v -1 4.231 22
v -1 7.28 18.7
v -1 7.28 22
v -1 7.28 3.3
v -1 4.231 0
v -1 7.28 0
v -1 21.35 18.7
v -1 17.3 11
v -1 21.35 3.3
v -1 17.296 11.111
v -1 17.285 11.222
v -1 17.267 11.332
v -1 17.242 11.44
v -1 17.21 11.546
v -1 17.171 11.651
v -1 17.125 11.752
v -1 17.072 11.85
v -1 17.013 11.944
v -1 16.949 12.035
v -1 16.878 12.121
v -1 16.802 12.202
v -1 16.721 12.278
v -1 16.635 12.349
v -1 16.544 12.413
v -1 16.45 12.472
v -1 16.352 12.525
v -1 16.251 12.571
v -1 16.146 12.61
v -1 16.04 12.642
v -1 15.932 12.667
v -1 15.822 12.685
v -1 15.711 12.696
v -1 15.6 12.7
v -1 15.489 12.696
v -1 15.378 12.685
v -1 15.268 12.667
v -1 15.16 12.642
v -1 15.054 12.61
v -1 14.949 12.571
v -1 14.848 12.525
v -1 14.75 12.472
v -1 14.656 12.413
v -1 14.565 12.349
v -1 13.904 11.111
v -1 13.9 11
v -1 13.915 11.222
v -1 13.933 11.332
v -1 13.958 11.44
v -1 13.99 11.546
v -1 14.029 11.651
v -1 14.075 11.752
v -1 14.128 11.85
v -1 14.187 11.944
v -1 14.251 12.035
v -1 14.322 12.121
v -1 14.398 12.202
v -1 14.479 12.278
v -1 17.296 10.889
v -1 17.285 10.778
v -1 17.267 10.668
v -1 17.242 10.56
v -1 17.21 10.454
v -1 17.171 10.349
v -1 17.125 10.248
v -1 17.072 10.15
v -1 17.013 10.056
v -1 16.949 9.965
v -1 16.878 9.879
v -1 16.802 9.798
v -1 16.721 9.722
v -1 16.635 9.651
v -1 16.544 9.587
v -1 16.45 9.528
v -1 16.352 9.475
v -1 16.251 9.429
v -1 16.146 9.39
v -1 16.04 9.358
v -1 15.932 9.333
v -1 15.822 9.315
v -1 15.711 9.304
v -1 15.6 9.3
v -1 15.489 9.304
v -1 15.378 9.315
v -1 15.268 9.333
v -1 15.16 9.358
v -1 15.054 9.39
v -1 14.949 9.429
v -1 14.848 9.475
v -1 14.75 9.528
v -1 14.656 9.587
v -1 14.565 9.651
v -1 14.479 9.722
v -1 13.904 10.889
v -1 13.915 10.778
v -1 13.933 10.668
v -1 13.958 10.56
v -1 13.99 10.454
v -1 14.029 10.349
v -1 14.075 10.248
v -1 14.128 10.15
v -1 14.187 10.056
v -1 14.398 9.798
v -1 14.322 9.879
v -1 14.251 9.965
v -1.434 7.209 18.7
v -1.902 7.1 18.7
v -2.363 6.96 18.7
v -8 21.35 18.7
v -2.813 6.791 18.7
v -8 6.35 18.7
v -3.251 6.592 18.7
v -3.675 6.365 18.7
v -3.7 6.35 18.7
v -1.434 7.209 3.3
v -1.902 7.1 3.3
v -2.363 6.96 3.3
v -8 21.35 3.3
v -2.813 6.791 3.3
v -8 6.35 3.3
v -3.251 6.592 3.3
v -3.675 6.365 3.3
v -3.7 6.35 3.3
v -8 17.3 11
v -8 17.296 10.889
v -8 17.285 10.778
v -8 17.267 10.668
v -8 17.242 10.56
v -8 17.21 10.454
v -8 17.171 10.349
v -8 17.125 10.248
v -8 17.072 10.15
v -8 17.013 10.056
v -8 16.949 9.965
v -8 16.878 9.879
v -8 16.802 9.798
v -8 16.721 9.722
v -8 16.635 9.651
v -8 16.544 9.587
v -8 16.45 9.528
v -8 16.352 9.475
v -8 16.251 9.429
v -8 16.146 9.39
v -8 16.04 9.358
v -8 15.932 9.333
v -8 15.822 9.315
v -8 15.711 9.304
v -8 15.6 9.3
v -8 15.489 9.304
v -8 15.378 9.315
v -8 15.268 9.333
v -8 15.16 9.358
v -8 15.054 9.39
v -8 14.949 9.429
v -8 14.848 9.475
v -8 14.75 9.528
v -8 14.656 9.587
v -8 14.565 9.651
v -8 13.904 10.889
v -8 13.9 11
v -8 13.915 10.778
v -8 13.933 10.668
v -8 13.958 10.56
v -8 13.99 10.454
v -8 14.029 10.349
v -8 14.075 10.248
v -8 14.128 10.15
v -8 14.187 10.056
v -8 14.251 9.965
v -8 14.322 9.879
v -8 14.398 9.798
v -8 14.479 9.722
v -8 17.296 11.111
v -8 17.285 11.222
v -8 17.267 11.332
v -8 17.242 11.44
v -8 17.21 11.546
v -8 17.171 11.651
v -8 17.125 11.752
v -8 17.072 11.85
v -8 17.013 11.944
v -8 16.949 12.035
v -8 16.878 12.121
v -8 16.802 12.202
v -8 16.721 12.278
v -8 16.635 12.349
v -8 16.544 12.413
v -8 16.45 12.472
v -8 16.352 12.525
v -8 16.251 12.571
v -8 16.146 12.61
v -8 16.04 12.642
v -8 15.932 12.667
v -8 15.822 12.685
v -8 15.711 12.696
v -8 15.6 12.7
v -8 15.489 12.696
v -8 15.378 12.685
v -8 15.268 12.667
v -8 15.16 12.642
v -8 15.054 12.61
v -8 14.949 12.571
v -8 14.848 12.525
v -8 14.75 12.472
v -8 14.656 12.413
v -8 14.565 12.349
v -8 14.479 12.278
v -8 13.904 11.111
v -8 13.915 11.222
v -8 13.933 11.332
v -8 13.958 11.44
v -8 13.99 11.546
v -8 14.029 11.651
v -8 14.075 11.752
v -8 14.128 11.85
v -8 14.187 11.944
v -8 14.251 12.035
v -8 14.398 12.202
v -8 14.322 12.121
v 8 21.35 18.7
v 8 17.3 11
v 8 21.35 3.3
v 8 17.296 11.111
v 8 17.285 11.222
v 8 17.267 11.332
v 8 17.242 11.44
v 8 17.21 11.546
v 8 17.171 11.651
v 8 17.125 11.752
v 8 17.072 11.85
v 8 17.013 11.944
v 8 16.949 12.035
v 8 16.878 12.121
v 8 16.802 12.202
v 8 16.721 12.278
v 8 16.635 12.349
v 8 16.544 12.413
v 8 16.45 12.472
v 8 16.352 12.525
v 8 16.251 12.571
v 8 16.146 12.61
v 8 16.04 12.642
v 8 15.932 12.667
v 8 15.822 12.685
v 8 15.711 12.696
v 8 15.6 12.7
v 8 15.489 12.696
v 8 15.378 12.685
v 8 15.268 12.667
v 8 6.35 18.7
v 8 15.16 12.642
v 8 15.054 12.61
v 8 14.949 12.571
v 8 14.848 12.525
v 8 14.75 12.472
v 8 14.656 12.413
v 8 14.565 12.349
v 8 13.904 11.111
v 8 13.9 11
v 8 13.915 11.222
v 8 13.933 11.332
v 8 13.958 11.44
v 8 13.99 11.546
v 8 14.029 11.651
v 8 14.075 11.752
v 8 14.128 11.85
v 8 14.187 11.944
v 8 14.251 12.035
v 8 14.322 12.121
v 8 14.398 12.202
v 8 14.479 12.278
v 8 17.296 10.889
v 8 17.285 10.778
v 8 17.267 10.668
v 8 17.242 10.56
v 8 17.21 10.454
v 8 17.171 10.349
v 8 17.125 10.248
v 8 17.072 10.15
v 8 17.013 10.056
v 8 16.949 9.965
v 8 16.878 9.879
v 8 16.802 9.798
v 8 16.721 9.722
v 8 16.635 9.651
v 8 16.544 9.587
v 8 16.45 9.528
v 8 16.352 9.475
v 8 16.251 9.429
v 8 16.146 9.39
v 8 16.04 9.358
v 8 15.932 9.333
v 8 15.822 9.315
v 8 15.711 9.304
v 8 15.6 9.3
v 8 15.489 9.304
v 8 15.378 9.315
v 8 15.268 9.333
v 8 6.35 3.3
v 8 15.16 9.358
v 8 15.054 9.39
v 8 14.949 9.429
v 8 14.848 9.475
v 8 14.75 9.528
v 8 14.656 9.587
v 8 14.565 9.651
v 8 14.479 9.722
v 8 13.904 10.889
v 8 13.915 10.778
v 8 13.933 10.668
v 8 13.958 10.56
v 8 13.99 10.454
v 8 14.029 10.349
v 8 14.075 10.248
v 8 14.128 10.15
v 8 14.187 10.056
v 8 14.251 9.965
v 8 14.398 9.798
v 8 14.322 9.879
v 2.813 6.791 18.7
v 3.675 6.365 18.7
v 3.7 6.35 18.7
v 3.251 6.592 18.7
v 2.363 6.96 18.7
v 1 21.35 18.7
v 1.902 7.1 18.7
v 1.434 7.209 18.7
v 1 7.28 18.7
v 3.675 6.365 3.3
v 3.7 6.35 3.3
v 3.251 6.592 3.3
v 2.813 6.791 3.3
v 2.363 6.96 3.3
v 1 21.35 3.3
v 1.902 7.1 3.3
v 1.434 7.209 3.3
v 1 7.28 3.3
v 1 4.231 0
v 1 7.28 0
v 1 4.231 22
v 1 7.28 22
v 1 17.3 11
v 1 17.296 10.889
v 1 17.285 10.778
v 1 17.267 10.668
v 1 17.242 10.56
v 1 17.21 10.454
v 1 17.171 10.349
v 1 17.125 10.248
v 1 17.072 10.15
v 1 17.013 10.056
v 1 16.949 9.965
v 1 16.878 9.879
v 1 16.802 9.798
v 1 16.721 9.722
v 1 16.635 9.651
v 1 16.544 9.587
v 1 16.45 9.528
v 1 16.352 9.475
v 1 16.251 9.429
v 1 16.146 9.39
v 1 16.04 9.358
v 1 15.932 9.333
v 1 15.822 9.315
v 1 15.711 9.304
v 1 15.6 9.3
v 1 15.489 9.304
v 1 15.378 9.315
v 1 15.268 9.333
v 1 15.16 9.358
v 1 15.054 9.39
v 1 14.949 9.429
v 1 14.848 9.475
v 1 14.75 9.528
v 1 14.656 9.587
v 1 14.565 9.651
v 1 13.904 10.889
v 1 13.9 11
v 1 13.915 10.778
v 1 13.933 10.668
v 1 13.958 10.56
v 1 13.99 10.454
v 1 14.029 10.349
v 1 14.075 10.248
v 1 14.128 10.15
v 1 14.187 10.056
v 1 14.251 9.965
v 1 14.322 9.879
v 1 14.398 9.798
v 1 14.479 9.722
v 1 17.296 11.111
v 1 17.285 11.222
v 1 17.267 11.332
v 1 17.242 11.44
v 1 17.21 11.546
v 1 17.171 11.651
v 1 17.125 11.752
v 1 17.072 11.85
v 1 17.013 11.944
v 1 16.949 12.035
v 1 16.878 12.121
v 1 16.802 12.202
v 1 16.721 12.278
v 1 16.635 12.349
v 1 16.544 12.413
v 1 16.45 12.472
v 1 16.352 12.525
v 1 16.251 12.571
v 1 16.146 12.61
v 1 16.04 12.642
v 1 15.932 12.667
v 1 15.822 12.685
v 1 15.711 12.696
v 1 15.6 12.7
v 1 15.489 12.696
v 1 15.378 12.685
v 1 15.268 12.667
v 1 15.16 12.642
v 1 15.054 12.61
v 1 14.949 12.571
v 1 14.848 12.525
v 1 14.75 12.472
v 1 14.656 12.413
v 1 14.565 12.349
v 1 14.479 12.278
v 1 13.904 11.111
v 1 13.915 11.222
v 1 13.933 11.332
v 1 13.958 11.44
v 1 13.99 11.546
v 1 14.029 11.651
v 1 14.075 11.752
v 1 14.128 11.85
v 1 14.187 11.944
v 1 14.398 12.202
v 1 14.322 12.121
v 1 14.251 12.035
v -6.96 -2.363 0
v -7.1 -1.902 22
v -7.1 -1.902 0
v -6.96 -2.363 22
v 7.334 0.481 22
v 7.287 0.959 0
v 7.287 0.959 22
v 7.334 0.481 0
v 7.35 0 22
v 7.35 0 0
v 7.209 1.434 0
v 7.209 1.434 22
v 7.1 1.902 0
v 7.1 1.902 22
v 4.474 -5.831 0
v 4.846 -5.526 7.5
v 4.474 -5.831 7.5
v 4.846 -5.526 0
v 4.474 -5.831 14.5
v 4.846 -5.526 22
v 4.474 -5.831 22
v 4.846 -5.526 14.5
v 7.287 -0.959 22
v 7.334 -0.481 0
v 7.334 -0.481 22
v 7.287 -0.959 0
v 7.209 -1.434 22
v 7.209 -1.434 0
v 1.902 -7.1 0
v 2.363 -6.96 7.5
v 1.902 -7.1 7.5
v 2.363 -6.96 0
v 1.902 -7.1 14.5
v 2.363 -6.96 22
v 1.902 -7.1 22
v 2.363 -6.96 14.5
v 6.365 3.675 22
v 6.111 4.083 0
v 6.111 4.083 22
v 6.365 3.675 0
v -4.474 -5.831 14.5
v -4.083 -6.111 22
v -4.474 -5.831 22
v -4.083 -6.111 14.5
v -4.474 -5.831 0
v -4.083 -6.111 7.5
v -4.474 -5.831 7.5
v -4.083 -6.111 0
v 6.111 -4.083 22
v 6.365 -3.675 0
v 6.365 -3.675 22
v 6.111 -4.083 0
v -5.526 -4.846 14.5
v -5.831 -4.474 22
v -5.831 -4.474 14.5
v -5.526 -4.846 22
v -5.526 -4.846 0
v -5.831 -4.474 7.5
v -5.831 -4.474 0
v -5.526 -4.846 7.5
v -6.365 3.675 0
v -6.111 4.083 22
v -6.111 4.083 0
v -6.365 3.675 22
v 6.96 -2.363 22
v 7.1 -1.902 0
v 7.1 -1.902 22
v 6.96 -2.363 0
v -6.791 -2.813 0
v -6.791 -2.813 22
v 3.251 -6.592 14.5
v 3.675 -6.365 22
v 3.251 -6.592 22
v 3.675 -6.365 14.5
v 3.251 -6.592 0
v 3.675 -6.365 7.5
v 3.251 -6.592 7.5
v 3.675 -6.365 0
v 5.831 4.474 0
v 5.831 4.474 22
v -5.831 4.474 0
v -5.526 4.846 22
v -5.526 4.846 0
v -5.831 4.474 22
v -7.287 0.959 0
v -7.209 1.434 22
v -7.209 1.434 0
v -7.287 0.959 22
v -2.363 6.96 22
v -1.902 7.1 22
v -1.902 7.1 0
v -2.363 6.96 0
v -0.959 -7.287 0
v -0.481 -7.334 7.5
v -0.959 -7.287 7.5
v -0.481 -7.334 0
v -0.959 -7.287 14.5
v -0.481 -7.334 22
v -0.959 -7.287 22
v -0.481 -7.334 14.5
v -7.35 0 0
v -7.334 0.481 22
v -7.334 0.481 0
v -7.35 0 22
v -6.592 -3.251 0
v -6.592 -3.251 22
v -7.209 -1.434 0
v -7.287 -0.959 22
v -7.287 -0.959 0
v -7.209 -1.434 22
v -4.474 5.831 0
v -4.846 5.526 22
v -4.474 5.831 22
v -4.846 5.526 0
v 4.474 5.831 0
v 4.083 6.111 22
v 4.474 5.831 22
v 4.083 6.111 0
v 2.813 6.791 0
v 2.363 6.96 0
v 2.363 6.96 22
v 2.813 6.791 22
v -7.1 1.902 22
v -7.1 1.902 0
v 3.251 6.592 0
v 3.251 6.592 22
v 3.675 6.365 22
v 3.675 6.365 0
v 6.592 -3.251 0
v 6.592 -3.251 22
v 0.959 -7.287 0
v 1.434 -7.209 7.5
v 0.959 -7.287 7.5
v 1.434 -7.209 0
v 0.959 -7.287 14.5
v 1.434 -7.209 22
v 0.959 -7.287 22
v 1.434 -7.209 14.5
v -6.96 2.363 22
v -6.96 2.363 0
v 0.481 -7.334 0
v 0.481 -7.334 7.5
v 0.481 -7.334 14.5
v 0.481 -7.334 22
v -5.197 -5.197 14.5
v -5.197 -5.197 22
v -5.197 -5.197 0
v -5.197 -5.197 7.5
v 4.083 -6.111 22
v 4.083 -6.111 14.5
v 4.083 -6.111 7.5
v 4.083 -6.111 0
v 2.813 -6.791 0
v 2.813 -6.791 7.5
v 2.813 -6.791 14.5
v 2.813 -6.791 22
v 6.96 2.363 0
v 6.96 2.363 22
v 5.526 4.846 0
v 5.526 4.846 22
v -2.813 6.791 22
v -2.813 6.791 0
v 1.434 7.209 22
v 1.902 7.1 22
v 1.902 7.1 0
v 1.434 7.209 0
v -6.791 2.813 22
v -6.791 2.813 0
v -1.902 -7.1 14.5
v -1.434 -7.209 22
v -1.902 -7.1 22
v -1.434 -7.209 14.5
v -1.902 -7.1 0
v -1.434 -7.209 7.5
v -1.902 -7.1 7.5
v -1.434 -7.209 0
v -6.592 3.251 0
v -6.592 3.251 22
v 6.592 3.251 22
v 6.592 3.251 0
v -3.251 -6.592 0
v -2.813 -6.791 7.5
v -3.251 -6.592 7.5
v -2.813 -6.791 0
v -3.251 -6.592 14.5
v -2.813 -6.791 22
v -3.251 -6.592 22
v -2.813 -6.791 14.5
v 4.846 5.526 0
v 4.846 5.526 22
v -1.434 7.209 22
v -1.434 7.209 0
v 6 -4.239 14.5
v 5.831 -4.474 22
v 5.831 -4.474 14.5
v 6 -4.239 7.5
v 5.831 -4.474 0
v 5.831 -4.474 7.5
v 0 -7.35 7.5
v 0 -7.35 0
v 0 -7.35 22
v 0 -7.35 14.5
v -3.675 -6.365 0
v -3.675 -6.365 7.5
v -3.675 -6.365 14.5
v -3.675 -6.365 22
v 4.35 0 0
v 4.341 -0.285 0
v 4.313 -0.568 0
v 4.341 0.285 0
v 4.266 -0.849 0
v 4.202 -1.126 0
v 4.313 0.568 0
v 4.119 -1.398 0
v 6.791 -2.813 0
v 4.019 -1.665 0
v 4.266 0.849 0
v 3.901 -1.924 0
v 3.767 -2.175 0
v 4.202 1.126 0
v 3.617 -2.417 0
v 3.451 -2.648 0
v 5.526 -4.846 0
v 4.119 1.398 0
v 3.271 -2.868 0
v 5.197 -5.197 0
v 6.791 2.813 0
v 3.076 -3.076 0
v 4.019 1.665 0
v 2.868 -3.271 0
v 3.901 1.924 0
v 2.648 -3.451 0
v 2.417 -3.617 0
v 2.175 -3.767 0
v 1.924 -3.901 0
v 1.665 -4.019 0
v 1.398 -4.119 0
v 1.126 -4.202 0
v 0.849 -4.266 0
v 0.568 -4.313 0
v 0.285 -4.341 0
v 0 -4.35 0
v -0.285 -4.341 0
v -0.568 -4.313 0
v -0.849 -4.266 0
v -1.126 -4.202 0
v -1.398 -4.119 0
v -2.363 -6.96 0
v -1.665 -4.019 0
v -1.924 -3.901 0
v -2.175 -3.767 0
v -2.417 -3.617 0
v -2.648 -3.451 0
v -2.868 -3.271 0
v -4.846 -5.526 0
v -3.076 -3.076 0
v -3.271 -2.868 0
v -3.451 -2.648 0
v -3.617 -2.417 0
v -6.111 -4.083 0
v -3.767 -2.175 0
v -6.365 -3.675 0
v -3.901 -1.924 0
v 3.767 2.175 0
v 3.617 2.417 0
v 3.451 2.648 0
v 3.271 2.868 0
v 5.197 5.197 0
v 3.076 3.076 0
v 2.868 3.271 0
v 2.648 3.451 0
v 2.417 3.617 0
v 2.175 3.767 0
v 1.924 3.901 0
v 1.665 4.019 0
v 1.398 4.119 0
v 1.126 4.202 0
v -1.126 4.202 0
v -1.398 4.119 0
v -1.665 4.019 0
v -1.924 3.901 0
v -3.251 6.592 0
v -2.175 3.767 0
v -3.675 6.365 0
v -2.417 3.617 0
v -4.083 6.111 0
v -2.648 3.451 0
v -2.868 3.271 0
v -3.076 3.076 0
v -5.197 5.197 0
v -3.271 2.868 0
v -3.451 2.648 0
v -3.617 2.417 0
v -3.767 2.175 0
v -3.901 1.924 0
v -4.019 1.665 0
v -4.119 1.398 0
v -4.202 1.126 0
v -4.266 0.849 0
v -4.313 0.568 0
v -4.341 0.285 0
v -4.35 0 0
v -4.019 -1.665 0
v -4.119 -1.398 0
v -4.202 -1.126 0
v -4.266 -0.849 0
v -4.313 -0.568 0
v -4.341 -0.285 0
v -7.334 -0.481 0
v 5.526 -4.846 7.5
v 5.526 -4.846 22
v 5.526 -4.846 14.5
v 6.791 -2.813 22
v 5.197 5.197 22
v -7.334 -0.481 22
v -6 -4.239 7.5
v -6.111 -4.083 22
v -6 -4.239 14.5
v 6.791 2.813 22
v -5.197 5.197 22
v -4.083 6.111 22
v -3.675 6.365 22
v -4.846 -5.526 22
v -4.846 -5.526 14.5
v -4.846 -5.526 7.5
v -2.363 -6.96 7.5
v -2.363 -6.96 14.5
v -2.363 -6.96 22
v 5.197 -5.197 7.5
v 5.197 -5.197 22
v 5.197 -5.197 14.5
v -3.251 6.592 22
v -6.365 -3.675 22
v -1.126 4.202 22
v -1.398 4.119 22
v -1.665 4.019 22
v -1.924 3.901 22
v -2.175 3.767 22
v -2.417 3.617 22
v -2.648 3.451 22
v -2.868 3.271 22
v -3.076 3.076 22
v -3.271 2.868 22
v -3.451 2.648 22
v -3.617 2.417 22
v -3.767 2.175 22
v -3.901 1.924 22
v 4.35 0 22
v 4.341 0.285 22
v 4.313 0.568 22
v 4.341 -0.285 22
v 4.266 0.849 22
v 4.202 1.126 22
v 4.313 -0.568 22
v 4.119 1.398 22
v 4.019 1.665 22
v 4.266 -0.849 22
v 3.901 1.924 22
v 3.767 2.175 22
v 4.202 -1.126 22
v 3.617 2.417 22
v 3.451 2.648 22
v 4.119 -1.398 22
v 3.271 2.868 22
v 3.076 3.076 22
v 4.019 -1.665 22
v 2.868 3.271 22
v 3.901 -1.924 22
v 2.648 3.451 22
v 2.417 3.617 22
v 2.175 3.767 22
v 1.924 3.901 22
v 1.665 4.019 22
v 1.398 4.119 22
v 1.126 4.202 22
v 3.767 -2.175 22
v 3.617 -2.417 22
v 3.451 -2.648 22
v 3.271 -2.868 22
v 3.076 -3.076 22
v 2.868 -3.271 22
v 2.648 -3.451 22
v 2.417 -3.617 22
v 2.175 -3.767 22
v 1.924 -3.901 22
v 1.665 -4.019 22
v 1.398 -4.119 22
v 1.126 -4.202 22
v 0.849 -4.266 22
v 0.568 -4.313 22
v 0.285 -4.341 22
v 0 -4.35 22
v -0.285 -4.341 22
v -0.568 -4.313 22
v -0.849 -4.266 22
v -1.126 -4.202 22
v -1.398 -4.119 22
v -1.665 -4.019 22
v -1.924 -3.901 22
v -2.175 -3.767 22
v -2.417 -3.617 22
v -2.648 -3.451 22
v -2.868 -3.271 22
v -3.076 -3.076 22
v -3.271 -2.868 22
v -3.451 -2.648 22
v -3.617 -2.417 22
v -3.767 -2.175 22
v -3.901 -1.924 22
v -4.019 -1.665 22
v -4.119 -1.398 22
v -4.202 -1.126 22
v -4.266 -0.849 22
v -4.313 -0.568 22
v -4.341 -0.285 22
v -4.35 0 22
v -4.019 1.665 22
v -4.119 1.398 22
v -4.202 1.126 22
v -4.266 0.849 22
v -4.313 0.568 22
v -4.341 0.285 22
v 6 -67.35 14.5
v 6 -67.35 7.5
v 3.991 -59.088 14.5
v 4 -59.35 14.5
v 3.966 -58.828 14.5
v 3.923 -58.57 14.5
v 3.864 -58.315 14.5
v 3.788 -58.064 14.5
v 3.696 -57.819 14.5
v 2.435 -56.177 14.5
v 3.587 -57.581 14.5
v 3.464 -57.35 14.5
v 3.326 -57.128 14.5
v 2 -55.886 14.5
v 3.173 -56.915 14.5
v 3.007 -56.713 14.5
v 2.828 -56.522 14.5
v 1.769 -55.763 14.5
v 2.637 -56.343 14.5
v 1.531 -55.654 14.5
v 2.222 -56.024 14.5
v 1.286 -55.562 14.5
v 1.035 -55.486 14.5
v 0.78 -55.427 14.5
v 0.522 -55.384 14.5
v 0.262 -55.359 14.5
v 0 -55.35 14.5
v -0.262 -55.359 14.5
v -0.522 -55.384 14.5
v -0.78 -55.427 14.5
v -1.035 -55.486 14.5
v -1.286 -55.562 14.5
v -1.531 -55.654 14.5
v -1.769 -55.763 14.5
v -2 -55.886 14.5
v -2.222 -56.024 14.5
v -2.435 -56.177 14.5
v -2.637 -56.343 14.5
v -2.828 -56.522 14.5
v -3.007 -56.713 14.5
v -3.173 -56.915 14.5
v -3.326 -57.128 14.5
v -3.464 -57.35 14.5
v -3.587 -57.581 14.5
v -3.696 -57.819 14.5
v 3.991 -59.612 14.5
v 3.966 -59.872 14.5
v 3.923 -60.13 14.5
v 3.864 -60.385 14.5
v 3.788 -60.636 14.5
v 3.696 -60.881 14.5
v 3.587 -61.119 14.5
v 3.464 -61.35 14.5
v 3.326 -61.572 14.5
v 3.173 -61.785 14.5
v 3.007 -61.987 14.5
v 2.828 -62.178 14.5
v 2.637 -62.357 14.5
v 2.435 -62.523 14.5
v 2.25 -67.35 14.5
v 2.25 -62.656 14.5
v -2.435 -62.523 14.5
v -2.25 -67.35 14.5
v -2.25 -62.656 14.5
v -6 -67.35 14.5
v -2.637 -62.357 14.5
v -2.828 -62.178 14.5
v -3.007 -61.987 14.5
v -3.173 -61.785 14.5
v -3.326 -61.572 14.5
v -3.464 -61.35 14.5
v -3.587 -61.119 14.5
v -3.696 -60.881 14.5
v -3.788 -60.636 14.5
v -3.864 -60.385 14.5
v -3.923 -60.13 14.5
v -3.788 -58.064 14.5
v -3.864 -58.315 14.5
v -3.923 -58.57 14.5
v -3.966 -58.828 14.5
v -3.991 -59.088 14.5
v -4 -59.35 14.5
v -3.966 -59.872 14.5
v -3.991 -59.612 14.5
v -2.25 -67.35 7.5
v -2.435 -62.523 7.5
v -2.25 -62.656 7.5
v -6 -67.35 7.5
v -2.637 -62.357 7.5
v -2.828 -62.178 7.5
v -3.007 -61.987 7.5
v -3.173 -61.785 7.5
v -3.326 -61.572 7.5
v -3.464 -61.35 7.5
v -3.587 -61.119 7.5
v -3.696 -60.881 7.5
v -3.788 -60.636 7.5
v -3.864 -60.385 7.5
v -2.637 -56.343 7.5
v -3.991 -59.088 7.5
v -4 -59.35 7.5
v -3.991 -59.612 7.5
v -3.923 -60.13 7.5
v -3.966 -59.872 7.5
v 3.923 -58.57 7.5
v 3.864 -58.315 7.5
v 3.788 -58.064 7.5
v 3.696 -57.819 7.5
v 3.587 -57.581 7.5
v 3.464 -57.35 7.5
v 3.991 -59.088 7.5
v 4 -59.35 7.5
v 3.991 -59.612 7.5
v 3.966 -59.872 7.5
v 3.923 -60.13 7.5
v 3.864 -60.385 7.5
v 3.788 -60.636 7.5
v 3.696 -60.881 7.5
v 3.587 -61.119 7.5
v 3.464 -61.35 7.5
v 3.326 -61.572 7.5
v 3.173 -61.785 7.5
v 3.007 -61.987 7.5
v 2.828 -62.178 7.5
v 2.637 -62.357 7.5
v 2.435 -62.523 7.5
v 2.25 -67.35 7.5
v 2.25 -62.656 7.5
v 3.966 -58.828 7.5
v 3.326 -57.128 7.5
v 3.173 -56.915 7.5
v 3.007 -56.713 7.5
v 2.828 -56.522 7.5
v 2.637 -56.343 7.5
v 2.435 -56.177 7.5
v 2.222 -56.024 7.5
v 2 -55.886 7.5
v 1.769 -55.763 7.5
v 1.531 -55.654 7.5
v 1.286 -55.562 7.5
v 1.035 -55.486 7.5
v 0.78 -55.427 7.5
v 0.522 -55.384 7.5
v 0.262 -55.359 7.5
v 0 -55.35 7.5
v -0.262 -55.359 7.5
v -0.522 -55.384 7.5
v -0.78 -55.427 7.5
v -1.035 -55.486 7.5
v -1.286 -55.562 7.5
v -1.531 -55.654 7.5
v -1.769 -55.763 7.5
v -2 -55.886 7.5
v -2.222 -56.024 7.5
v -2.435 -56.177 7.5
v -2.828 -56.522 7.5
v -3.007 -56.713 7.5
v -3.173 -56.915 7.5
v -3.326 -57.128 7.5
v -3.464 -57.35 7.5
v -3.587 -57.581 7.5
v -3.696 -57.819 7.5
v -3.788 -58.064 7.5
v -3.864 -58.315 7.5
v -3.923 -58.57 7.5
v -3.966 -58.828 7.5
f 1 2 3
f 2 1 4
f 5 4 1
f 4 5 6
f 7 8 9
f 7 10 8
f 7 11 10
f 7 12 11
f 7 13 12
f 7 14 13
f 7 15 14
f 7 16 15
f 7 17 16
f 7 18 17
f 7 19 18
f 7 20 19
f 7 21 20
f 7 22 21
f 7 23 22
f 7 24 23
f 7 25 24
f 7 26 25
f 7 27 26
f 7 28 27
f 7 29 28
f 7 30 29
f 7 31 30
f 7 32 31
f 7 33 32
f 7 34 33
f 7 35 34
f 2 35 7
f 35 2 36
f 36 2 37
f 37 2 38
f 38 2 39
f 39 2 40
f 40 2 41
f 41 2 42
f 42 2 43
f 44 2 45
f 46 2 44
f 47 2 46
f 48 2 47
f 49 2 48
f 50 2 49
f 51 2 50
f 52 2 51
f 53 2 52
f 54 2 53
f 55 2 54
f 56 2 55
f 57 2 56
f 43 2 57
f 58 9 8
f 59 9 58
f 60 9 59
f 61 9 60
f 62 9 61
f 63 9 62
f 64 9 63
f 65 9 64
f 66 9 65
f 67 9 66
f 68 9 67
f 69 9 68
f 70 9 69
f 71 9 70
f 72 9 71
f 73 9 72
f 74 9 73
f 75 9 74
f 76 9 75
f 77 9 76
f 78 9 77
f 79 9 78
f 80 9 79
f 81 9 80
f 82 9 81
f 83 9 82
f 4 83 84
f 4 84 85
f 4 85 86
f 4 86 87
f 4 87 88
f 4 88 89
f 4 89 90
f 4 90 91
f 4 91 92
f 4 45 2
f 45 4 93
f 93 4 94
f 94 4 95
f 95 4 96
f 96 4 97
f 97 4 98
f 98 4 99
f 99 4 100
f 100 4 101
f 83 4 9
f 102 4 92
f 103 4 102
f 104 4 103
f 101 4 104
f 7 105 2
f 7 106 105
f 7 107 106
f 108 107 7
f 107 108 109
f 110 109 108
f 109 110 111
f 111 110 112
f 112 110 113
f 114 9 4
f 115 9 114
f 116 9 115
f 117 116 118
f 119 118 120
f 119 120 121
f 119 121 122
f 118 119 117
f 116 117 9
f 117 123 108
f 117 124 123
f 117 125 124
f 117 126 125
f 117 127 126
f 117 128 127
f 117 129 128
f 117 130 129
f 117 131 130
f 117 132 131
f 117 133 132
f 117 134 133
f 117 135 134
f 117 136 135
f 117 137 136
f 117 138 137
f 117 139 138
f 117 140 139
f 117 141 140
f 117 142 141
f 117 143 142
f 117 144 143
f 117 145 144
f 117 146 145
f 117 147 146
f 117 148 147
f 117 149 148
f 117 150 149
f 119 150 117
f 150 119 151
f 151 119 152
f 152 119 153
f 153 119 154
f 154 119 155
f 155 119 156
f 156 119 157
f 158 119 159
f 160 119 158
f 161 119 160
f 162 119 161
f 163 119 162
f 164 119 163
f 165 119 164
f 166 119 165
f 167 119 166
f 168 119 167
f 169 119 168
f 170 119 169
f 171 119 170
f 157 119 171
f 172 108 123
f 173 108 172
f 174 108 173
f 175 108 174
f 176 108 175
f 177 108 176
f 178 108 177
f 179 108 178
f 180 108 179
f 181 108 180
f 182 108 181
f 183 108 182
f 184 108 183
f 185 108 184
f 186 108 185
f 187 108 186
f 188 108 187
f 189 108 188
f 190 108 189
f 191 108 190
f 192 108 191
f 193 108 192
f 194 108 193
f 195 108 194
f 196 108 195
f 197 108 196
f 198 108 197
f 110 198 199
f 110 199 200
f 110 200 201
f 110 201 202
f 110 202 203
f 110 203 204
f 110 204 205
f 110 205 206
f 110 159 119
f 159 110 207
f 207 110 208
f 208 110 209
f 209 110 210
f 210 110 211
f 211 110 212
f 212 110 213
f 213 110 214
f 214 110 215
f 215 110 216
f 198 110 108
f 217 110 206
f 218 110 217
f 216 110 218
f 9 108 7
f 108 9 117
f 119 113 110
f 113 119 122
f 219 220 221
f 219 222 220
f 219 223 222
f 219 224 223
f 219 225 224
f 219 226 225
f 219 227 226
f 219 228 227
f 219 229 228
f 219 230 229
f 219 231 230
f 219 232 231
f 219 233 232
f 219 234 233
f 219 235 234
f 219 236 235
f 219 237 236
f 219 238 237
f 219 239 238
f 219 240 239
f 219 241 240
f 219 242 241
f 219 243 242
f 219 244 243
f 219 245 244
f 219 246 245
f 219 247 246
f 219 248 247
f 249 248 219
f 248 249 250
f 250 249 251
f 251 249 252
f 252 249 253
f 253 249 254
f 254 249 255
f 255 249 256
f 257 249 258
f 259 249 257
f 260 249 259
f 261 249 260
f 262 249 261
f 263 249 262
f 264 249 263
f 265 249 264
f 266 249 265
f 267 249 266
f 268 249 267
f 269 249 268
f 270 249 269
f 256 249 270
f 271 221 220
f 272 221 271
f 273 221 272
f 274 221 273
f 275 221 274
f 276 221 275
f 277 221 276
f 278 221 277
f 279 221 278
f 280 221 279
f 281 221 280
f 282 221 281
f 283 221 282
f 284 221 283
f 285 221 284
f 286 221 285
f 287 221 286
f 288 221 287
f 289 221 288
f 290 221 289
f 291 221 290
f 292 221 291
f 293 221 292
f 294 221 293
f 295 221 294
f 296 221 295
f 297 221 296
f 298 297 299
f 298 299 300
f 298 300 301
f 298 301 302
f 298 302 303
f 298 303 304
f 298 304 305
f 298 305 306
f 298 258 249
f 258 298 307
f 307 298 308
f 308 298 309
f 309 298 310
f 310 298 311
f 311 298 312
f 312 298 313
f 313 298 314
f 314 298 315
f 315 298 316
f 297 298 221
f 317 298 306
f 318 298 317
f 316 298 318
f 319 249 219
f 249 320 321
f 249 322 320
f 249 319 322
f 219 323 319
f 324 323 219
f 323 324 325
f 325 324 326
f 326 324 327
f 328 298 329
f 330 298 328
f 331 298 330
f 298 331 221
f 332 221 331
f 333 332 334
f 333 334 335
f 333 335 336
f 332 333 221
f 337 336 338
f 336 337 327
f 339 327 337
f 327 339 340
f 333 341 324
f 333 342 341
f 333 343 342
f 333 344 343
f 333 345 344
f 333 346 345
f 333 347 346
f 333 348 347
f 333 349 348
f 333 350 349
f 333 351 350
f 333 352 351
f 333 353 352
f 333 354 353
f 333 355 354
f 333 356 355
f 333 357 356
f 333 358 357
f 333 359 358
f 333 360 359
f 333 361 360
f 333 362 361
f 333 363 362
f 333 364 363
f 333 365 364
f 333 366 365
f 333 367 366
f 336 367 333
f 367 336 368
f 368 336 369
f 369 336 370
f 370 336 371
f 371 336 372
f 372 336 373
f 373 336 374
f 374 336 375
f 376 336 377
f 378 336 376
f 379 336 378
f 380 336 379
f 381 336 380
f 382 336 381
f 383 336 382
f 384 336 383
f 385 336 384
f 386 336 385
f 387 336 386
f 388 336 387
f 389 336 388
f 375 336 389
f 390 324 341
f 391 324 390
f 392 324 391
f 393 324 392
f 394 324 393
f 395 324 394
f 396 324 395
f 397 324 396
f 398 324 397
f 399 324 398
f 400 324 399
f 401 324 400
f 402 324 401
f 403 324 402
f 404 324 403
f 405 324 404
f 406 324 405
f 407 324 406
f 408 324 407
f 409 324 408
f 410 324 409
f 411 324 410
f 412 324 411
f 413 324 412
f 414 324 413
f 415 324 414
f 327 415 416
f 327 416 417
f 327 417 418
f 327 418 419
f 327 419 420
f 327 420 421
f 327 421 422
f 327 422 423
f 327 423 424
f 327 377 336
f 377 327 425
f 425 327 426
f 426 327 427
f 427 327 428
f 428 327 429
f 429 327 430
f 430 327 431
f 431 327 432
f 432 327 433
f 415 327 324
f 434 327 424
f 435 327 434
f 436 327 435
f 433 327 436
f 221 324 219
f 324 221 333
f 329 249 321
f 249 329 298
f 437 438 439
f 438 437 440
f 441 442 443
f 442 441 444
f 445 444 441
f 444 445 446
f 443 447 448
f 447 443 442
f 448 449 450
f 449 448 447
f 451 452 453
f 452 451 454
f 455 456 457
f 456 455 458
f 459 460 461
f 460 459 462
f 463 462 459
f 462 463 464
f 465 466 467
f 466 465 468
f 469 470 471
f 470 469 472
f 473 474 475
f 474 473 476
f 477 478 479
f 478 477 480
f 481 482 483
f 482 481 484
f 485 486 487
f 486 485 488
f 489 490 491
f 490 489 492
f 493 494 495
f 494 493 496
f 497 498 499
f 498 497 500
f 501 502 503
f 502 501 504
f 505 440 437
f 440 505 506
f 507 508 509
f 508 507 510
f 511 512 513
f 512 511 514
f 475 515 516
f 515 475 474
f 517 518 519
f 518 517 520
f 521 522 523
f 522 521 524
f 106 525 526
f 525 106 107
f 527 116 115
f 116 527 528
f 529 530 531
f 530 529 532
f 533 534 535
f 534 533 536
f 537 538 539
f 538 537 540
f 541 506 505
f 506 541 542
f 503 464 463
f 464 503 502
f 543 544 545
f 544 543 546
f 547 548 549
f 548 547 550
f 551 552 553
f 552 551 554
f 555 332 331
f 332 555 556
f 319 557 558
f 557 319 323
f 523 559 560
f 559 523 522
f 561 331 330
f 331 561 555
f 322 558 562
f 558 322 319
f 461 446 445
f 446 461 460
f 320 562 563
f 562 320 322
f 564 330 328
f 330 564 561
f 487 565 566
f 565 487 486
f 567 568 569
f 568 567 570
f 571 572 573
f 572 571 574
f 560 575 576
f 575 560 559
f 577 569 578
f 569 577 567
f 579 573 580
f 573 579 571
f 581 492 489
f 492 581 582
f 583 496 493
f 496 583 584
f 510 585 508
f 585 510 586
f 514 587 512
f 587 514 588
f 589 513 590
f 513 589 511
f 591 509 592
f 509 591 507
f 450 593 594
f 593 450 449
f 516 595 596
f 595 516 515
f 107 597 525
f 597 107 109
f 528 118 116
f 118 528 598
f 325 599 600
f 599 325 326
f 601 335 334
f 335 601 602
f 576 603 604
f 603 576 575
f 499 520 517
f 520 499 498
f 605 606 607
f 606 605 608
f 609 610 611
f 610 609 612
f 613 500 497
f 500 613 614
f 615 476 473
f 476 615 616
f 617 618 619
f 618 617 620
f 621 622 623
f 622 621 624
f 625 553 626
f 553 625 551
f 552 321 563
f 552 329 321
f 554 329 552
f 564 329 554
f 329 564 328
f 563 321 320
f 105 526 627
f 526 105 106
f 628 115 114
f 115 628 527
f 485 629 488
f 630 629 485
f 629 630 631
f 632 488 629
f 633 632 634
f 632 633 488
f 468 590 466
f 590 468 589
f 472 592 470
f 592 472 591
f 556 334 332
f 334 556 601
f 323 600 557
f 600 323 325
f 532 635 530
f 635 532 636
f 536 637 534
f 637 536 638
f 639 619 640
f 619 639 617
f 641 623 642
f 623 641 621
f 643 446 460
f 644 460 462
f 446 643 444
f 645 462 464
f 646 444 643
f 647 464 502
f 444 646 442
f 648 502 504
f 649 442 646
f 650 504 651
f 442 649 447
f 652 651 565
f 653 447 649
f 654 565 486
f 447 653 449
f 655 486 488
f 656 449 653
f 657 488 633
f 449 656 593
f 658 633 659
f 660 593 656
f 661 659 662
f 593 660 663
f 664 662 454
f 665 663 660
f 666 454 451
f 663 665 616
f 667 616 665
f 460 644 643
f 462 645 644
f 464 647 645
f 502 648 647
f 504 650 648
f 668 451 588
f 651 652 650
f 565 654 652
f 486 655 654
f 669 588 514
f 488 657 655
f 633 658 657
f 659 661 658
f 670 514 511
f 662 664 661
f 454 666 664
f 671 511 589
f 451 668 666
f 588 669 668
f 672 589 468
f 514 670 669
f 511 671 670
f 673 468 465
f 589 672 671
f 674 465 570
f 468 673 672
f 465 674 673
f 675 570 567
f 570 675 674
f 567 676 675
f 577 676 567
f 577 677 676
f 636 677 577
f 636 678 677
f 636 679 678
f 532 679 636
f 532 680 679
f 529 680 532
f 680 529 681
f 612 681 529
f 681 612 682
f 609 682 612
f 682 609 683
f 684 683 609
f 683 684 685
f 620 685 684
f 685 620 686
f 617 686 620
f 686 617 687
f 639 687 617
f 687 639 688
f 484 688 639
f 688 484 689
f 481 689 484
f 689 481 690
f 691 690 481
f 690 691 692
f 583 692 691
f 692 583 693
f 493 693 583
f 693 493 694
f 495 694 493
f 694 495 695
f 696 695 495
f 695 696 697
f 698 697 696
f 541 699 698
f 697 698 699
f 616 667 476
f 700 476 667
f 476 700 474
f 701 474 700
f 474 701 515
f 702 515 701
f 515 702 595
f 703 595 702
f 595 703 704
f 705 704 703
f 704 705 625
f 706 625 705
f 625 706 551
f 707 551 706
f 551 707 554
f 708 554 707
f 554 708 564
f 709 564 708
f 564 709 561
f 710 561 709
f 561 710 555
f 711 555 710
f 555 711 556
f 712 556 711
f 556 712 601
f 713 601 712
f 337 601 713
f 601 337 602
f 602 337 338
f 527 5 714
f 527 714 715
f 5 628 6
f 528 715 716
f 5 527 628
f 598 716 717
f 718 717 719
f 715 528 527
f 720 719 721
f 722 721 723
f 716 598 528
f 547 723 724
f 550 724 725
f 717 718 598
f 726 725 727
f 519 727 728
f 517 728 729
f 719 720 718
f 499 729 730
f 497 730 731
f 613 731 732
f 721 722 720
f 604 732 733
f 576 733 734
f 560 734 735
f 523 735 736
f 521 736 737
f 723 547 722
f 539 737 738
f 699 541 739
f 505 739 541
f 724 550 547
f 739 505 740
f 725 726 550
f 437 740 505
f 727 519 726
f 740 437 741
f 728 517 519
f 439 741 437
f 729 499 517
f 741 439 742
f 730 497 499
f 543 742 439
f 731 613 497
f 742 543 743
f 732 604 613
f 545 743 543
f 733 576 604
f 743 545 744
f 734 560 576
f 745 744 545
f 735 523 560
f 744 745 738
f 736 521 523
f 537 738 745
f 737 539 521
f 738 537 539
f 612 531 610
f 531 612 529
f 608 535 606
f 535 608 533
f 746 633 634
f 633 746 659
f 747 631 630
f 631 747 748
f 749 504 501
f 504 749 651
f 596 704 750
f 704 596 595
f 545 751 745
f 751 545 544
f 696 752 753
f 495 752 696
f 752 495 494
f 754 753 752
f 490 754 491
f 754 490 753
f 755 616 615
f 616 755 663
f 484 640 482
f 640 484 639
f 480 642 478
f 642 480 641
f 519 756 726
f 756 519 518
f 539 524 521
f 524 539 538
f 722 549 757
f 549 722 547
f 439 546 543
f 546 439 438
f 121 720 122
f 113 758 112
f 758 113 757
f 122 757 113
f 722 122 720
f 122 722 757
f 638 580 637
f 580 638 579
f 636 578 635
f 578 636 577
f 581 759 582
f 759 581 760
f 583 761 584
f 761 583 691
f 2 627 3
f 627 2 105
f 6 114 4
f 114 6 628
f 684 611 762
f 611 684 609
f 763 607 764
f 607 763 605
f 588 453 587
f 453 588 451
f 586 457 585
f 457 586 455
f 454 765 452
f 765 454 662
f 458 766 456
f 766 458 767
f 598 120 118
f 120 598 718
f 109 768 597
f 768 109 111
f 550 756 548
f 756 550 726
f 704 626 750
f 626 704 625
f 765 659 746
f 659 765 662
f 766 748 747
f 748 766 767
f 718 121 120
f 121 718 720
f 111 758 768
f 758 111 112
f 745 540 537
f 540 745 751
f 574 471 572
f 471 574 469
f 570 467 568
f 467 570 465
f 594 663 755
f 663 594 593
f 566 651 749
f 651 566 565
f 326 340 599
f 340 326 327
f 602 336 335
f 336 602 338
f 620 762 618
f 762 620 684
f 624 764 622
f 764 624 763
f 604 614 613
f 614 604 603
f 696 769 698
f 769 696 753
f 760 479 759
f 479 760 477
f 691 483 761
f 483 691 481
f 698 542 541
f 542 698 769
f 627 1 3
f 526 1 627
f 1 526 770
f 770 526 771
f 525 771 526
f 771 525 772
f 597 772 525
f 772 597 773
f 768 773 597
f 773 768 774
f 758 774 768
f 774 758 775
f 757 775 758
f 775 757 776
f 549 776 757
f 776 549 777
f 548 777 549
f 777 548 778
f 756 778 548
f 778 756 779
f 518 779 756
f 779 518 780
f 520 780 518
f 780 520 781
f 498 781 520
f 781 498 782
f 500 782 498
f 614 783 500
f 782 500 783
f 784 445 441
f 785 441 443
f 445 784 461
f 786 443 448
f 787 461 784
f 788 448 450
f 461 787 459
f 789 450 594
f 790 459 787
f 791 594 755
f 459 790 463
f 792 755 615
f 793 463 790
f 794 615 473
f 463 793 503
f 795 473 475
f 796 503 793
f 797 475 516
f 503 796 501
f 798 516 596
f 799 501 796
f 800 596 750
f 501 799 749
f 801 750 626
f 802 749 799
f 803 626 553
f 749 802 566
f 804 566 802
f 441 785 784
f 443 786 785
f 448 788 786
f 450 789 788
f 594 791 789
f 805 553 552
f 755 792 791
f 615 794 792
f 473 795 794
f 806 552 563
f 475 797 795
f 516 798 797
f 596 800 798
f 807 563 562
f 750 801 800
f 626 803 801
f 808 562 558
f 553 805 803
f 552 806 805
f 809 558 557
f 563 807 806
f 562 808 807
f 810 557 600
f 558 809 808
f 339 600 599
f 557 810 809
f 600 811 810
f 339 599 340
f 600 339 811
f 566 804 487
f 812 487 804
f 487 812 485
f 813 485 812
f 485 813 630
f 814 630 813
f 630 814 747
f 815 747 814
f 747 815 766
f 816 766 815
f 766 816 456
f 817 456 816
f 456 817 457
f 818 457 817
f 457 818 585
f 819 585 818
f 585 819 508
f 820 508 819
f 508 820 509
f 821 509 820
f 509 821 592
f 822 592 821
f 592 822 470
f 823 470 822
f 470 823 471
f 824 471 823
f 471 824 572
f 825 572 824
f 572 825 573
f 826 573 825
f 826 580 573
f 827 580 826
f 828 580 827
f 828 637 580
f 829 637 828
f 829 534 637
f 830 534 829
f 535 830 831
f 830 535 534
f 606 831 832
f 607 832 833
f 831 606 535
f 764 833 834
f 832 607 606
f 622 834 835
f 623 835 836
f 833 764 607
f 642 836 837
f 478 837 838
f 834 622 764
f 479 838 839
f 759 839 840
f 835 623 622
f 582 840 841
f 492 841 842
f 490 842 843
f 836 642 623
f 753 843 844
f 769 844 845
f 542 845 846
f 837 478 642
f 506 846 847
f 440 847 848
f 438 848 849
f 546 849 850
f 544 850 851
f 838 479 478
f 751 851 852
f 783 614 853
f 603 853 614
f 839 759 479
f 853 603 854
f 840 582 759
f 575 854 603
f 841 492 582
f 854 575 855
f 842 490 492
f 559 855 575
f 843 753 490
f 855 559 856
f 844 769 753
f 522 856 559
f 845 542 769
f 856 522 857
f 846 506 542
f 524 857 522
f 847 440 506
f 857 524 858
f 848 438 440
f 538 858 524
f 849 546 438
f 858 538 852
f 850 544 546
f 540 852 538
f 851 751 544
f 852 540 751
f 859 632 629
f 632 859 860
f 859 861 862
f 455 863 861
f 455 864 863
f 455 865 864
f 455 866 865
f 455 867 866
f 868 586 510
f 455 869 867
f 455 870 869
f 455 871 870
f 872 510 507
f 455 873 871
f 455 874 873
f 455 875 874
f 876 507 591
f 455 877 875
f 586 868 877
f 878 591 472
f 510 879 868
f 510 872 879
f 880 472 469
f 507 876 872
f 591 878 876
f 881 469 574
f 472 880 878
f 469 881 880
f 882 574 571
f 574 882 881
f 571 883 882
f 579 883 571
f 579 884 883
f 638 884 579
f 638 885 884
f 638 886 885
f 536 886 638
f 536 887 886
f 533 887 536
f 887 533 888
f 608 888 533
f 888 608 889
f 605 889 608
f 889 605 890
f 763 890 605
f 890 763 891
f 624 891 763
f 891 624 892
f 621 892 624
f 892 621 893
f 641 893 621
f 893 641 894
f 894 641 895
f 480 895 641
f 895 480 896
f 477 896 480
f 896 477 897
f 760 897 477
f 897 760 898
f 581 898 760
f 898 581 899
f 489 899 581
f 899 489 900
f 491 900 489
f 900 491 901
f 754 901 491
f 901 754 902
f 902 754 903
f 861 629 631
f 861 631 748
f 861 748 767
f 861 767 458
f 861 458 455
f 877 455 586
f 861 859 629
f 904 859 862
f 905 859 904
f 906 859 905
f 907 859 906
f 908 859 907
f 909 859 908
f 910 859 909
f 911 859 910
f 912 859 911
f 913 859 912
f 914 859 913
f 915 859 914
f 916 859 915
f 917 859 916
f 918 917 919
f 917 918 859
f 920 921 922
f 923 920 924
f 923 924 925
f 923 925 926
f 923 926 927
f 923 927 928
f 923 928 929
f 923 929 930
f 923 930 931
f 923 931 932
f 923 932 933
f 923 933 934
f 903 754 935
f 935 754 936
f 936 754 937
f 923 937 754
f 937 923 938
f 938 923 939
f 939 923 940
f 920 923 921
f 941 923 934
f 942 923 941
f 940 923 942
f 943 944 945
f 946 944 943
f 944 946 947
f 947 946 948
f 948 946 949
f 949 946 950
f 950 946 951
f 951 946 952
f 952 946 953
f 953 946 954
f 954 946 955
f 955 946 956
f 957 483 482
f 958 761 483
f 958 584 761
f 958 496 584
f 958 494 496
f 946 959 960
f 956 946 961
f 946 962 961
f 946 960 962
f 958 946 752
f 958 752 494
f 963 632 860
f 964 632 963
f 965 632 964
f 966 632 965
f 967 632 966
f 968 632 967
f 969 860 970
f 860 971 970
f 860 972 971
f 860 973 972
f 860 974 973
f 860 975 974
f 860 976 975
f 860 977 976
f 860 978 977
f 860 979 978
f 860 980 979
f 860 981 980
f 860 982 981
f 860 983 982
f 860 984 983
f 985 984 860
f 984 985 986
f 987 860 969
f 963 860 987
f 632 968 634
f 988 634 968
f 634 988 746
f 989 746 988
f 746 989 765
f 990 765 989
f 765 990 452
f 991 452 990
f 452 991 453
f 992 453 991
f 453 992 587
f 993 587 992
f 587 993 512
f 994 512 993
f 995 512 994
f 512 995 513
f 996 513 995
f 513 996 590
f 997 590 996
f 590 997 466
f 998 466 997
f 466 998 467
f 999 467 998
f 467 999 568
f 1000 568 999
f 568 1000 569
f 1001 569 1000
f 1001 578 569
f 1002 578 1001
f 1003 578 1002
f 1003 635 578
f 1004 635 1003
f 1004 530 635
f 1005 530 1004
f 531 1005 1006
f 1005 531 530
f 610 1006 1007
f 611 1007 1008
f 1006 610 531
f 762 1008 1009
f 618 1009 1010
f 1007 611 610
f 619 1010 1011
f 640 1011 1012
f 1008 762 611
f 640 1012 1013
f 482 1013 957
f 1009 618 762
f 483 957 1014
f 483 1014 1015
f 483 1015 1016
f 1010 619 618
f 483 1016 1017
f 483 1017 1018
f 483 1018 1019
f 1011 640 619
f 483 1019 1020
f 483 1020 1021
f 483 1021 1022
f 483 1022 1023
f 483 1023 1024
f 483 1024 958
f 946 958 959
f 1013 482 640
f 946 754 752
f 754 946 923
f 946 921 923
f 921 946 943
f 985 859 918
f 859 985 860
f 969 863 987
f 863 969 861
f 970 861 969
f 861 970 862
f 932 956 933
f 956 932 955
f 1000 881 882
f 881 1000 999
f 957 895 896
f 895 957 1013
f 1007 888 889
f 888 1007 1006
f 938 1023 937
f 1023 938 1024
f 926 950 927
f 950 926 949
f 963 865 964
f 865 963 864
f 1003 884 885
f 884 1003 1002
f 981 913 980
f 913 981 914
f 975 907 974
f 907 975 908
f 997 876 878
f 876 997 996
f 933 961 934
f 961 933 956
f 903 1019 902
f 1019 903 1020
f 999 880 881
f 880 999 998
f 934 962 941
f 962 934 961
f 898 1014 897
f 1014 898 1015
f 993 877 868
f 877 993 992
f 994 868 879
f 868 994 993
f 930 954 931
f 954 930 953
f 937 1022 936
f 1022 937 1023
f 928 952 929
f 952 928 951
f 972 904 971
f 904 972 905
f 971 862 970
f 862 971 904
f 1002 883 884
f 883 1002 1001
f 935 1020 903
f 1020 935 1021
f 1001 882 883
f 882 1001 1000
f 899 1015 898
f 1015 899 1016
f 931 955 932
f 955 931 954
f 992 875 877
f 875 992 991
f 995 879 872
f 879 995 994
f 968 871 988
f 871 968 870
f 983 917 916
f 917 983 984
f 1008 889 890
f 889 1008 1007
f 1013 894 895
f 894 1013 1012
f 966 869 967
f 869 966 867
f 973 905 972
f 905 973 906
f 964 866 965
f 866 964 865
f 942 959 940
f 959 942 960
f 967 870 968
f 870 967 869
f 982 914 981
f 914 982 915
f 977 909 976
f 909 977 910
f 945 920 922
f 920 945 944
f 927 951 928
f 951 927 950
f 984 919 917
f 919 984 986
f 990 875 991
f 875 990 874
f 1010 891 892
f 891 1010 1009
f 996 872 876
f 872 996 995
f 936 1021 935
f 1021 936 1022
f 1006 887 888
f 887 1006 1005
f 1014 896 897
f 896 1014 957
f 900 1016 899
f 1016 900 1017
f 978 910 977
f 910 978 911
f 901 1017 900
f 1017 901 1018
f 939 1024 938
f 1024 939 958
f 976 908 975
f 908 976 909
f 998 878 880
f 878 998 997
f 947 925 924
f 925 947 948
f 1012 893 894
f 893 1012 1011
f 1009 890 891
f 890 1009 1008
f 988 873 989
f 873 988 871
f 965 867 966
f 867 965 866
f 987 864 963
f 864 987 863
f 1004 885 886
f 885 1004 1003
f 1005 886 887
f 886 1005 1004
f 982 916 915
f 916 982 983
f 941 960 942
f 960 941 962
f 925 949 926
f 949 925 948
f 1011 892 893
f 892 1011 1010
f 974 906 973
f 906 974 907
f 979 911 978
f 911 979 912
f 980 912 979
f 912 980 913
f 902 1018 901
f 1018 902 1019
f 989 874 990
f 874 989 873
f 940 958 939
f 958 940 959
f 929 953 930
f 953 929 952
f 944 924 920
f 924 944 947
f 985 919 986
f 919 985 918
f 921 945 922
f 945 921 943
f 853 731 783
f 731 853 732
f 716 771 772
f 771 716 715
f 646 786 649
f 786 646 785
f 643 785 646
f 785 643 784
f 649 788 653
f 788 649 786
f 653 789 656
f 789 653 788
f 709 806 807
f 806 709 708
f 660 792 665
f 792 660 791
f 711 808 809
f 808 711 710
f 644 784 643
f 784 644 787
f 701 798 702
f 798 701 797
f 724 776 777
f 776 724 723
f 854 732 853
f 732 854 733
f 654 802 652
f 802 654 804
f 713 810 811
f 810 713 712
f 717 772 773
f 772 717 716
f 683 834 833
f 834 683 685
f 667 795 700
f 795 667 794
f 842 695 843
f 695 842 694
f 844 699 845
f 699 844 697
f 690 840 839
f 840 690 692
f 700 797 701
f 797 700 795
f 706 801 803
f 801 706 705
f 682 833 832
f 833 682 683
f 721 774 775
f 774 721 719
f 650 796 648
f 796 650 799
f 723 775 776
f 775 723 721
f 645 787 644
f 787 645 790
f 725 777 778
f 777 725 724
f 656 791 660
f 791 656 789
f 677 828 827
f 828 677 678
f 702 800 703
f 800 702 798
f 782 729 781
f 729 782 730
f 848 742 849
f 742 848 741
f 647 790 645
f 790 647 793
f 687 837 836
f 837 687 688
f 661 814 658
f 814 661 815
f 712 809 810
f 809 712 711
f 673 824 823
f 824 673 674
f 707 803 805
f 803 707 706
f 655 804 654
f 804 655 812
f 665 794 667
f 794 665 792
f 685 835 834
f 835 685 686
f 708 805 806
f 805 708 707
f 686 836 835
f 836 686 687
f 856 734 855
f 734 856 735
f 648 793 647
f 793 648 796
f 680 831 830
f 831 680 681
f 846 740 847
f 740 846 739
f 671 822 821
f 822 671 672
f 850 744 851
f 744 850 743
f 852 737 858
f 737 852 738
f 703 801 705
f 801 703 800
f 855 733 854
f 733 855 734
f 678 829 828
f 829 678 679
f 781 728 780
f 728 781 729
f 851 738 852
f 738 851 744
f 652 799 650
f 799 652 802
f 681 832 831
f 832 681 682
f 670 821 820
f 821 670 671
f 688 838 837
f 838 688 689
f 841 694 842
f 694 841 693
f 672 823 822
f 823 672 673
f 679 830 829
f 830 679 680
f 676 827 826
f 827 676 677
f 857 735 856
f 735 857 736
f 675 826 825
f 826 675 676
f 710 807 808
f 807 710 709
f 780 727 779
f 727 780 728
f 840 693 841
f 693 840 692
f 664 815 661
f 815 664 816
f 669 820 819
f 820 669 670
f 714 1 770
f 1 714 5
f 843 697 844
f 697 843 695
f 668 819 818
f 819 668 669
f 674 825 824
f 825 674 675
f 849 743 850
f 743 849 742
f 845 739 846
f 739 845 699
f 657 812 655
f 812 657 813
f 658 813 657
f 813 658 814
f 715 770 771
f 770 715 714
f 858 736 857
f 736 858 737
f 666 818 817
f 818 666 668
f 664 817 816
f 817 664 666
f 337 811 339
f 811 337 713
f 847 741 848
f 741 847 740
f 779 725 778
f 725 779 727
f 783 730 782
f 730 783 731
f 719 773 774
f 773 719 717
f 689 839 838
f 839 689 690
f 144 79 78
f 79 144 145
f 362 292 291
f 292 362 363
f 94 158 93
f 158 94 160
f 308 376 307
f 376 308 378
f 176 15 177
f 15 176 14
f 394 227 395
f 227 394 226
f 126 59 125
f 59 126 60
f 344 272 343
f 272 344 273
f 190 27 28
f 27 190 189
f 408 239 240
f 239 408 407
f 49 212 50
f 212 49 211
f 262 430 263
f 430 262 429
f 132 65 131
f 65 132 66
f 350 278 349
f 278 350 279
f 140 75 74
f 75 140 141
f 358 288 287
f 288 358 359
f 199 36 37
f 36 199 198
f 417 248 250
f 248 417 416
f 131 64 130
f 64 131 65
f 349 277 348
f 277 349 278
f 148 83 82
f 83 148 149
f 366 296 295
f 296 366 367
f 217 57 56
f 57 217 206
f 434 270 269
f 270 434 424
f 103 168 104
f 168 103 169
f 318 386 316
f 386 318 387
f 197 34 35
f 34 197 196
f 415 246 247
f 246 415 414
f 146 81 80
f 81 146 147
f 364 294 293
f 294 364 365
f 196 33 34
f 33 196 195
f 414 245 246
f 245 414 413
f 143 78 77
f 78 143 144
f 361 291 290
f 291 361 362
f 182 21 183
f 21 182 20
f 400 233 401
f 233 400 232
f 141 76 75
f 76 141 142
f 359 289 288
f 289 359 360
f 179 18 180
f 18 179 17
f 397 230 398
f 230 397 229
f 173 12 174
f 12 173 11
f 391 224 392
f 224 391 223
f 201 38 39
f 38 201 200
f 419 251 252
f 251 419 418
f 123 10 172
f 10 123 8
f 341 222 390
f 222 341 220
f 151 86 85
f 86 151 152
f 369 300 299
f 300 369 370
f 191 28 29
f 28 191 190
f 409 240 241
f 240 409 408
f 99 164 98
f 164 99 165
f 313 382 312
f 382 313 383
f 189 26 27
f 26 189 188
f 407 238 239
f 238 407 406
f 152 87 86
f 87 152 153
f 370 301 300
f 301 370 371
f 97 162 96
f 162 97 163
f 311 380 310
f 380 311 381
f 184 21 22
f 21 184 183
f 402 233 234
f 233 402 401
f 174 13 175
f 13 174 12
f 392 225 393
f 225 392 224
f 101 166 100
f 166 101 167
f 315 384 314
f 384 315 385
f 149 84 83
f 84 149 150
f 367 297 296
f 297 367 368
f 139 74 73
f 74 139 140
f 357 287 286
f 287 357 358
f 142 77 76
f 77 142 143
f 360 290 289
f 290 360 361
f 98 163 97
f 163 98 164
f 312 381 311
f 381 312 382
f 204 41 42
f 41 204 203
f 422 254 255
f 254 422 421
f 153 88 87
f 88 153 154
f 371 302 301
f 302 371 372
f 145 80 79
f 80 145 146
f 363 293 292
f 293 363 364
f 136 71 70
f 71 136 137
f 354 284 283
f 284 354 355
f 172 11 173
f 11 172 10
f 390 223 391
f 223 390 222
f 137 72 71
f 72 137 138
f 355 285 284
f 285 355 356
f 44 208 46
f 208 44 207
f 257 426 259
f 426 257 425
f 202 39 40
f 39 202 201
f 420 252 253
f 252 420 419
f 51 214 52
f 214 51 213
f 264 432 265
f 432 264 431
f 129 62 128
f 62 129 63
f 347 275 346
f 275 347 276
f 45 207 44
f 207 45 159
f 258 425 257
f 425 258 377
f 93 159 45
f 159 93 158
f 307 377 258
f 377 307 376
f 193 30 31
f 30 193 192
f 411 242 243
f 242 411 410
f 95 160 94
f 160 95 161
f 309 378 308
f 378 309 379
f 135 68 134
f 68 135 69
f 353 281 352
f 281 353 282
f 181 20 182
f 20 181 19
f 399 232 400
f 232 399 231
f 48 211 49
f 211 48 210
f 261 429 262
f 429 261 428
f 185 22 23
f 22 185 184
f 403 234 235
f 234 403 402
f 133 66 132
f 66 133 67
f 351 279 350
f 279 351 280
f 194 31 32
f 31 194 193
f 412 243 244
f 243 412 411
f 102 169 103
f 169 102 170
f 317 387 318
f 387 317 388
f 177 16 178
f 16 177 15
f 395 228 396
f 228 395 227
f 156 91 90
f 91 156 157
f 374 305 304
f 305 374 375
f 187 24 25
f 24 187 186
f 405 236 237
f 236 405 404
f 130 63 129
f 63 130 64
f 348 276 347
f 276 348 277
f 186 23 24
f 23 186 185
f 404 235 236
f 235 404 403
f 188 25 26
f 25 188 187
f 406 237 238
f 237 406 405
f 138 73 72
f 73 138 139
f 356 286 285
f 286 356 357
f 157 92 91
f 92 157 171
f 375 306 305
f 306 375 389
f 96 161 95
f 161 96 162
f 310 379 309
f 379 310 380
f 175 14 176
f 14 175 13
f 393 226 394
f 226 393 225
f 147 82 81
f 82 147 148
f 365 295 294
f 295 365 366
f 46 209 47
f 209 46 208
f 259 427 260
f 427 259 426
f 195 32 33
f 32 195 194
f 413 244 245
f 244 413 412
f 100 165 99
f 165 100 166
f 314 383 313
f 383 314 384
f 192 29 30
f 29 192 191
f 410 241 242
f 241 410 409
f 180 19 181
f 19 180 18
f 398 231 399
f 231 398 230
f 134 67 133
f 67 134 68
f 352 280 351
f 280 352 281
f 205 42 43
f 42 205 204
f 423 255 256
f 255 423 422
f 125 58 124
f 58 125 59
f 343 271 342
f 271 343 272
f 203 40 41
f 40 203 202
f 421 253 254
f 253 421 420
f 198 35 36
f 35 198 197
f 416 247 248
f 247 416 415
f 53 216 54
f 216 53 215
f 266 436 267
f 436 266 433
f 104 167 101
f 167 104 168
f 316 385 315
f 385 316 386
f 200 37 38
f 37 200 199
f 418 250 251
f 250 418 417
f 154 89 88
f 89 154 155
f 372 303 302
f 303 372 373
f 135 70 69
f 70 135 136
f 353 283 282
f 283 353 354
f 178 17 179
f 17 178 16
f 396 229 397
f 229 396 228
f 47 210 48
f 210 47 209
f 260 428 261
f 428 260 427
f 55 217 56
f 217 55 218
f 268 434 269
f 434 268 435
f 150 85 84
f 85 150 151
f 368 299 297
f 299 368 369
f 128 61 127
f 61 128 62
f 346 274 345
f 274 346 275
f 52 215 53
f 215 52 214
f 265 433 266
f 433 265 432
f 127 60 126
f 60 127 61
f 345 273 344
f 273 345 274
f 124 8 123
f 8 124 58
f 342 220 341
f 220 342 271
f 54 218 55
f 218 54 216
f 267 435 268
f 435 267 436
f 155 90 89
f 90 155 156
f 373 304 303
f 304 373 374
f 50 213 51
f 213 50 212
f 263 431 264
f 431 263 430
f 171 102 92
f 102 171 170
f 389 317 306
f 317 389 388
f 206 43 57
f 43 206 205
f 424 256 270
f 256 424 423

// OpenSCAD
// file: common.scad
// common.scad — shared parameters for the aquarium grow-box parts.
// Everything downstream is driven from here. Measure YOUR tank, fan and lid
// with calipers and edit this file; do not trust the defaults.

$fn = 96;

/* ---------------- measured inputs ---------------- */
glass_t  = 6;      // tank wall glass thickness. 20-long / 29 gal is usually 5-6 mm.
rim_w    = 14;     // width of the plastic top trim, front to back
rim_h    = 16;     // height of the plastic top trim
lid_t    = 3;      // lid sheet thickness. 3 mm polycarbonate is the default.
duct_nom = 101.6;  // 4 in duct. Use 152.4 for a 6 in fan.
probe_d  = 10;     // sensor-probe body diameter
cable_d  = 6;      // fattest cable that must pass through the lid

/* ---------------- print fit ---------------- */
slop = 0.35;  // clearance per side on sliding fits
wall = 3;     // default wall thickness
eps  = 0.01;  // z-fighting guard

/* ---------------- helpers ---------------- */

// A ring of clearance holes, drilled from z=0 upward.
module bolt_ring(count, radius, hole_d, depth) {
    for (i = [0 : count - 1])
        rotate([0, 0, i * 360 / count])
            translate([radius, 0, -eps])
                cylinder(d = hole_d, h = depth + 2 * eps);
}

// Rounded rectangular plate centred on the origin, sitting on z=0.
module rounded_plate(x, y, z, r = 4) {
    hull()
        for (dx = [-1, 1], dy = [-1, 1])
            translate([dx * (x / 2 - r), dy * (y / 2 - r), 0])
                cylinder(r = r, h = z);
}

// Four corner clearance holes inset from the edges of an x by y plate.
module corner_holes(x, y, inset, hole_d, depth) {
    for (dx = [-1, 1], dy = [-1, 1])
        translate([dx * (x / 2 - inset), dy * (y / 2 - inset), -eps])
            cylinder(d = hole_d, h = depth + 2 * eps);
}

// Upside-down U that straddles the tank's top trim. Opening faces -z, length
// runs along x. -y is the tank interior, +y is the outside.
// `outer_foot` extends the outer wall down the outside glass: that is what
// stops a hanging load from levering the part off the rim. Put a strip of EVA
// foam between the foot and the glass.
// Print with the opening facing up, no supports.
module rim_saddle(len = 40, jaw = rim_w, depth = rim_h * 0.8, t = wall,
                  outer_foot = 0) {
    union() {
        difference() {
            translate([-len / 2, -(jaw / 2 + t), 0])
                cube([len, jaw + 2 * t, depth + t]);
            translate([-len / 2 - eps, -(jaw / 2 + slop), -eps])
                cube([len + 2 * eps, jaw + 2 * slop, depth + eps]);
        }
        if (outer_foot > 0)
            translate([-len / 2, jaw / 2 + slop, -outer_foot])
                cube([len, t - slop, outer_foot + eps]);
    }
}

// Height of the top face of a default rim_saddle.
saddle_top = rim_h * 0.8 + wall;

// Right-triangle brace: base `len` along +x, `height` along +z, `thick` in -y.
module gusset(len, height, thick) {
    rotate([90, 0, 0])
        linear_extrude(height = thick)
            polygon([[0, 0], [len, 0], [0, height]]);
}
// main file
// mast_hook.scad — split collar that pinches the 8 mm mast at any height and
// reaches inboard to carry one of the light's hanger cords. Two per light.
// Loosen the M3 bolt, slide, retighten: that is the light-height adjustment.
// Print collar-axis vertical, arm flat on the bed.

include <common.scad>

rod_d     = 8;
collar_id = rod_d + 2 * slop;
collar_od = collar_id + 2 * wall;
collar_h  = 22;
slit_w    = 2;
ear_x     = 7;      // ear thickness either side of the slit
ear_y     = 15;     // how far the ears reach past the collar
bolt_d    = 3.4;    // M3 clearance
arm_len   = 60;     // reach in over the tank
arm_w     = 12;
arm_t     = 7;
hook_d    = 8;      // cord / carabiner hole
hook_gap  = 4.5;    // open throat so a cord drops in

module ears() {
    for (sx = [-1, 1])
        translate([sx * (slit_w / 2 + ear_x / 2), collar_od / 2 + ear_y / 2 - 1, collar_h / 2])
            cube([ear_x, ear_y, collar_h * 0.7], center = true);
}

module arm() {
    translate([-arm_w / 2, -(collar_od / 2 + arm_len), collar_h / 2 - arm_t / 2])
        cube([arm_w, arm_len + collar_od / 2, arm_t]);
}

module mast_hook() {
    difference() {
        union() {
            cylinder(d = collar_od, h = collar_h);
            ears();
            arm();
        }
        // rod bore
        translate([0, 0, -eps])
            cylinder(d = collar_id, h = collar_h + 2 * eps);
        // pinch slit, from the bore out through the ears
        translate([-slit_w / 2, 0, -eps])
            cube([slit_w, collar_od / 2 + ear_y + 2, collar_h + 2 * eps]);
        // pinch bolt across the ears
        translate([-(slit_w / 2 + ear_x + 2), collar_od / 2 + ear_y * 0.55, collar_h / 2])
            rotate([0, 90, 0])
                cylinder(d = bolt_d, h = slit_w + 2 * ear_x + 4);
        // cord hole with an open throat at the end of the arm
        translate([0, -(collar_od / 2 + arm_len - hook_d), collar_h / 2 - arm_t / 2 - eps]) {
            cylinder(d = hook_d, h = arm_t + 2 * eps);
            translate([-hook_gap / 2, -hook_d, 0])
                cube([hook_gap, hook_d, arm_t + 2 * eps]);
        }
    }
}

mast_hook();
